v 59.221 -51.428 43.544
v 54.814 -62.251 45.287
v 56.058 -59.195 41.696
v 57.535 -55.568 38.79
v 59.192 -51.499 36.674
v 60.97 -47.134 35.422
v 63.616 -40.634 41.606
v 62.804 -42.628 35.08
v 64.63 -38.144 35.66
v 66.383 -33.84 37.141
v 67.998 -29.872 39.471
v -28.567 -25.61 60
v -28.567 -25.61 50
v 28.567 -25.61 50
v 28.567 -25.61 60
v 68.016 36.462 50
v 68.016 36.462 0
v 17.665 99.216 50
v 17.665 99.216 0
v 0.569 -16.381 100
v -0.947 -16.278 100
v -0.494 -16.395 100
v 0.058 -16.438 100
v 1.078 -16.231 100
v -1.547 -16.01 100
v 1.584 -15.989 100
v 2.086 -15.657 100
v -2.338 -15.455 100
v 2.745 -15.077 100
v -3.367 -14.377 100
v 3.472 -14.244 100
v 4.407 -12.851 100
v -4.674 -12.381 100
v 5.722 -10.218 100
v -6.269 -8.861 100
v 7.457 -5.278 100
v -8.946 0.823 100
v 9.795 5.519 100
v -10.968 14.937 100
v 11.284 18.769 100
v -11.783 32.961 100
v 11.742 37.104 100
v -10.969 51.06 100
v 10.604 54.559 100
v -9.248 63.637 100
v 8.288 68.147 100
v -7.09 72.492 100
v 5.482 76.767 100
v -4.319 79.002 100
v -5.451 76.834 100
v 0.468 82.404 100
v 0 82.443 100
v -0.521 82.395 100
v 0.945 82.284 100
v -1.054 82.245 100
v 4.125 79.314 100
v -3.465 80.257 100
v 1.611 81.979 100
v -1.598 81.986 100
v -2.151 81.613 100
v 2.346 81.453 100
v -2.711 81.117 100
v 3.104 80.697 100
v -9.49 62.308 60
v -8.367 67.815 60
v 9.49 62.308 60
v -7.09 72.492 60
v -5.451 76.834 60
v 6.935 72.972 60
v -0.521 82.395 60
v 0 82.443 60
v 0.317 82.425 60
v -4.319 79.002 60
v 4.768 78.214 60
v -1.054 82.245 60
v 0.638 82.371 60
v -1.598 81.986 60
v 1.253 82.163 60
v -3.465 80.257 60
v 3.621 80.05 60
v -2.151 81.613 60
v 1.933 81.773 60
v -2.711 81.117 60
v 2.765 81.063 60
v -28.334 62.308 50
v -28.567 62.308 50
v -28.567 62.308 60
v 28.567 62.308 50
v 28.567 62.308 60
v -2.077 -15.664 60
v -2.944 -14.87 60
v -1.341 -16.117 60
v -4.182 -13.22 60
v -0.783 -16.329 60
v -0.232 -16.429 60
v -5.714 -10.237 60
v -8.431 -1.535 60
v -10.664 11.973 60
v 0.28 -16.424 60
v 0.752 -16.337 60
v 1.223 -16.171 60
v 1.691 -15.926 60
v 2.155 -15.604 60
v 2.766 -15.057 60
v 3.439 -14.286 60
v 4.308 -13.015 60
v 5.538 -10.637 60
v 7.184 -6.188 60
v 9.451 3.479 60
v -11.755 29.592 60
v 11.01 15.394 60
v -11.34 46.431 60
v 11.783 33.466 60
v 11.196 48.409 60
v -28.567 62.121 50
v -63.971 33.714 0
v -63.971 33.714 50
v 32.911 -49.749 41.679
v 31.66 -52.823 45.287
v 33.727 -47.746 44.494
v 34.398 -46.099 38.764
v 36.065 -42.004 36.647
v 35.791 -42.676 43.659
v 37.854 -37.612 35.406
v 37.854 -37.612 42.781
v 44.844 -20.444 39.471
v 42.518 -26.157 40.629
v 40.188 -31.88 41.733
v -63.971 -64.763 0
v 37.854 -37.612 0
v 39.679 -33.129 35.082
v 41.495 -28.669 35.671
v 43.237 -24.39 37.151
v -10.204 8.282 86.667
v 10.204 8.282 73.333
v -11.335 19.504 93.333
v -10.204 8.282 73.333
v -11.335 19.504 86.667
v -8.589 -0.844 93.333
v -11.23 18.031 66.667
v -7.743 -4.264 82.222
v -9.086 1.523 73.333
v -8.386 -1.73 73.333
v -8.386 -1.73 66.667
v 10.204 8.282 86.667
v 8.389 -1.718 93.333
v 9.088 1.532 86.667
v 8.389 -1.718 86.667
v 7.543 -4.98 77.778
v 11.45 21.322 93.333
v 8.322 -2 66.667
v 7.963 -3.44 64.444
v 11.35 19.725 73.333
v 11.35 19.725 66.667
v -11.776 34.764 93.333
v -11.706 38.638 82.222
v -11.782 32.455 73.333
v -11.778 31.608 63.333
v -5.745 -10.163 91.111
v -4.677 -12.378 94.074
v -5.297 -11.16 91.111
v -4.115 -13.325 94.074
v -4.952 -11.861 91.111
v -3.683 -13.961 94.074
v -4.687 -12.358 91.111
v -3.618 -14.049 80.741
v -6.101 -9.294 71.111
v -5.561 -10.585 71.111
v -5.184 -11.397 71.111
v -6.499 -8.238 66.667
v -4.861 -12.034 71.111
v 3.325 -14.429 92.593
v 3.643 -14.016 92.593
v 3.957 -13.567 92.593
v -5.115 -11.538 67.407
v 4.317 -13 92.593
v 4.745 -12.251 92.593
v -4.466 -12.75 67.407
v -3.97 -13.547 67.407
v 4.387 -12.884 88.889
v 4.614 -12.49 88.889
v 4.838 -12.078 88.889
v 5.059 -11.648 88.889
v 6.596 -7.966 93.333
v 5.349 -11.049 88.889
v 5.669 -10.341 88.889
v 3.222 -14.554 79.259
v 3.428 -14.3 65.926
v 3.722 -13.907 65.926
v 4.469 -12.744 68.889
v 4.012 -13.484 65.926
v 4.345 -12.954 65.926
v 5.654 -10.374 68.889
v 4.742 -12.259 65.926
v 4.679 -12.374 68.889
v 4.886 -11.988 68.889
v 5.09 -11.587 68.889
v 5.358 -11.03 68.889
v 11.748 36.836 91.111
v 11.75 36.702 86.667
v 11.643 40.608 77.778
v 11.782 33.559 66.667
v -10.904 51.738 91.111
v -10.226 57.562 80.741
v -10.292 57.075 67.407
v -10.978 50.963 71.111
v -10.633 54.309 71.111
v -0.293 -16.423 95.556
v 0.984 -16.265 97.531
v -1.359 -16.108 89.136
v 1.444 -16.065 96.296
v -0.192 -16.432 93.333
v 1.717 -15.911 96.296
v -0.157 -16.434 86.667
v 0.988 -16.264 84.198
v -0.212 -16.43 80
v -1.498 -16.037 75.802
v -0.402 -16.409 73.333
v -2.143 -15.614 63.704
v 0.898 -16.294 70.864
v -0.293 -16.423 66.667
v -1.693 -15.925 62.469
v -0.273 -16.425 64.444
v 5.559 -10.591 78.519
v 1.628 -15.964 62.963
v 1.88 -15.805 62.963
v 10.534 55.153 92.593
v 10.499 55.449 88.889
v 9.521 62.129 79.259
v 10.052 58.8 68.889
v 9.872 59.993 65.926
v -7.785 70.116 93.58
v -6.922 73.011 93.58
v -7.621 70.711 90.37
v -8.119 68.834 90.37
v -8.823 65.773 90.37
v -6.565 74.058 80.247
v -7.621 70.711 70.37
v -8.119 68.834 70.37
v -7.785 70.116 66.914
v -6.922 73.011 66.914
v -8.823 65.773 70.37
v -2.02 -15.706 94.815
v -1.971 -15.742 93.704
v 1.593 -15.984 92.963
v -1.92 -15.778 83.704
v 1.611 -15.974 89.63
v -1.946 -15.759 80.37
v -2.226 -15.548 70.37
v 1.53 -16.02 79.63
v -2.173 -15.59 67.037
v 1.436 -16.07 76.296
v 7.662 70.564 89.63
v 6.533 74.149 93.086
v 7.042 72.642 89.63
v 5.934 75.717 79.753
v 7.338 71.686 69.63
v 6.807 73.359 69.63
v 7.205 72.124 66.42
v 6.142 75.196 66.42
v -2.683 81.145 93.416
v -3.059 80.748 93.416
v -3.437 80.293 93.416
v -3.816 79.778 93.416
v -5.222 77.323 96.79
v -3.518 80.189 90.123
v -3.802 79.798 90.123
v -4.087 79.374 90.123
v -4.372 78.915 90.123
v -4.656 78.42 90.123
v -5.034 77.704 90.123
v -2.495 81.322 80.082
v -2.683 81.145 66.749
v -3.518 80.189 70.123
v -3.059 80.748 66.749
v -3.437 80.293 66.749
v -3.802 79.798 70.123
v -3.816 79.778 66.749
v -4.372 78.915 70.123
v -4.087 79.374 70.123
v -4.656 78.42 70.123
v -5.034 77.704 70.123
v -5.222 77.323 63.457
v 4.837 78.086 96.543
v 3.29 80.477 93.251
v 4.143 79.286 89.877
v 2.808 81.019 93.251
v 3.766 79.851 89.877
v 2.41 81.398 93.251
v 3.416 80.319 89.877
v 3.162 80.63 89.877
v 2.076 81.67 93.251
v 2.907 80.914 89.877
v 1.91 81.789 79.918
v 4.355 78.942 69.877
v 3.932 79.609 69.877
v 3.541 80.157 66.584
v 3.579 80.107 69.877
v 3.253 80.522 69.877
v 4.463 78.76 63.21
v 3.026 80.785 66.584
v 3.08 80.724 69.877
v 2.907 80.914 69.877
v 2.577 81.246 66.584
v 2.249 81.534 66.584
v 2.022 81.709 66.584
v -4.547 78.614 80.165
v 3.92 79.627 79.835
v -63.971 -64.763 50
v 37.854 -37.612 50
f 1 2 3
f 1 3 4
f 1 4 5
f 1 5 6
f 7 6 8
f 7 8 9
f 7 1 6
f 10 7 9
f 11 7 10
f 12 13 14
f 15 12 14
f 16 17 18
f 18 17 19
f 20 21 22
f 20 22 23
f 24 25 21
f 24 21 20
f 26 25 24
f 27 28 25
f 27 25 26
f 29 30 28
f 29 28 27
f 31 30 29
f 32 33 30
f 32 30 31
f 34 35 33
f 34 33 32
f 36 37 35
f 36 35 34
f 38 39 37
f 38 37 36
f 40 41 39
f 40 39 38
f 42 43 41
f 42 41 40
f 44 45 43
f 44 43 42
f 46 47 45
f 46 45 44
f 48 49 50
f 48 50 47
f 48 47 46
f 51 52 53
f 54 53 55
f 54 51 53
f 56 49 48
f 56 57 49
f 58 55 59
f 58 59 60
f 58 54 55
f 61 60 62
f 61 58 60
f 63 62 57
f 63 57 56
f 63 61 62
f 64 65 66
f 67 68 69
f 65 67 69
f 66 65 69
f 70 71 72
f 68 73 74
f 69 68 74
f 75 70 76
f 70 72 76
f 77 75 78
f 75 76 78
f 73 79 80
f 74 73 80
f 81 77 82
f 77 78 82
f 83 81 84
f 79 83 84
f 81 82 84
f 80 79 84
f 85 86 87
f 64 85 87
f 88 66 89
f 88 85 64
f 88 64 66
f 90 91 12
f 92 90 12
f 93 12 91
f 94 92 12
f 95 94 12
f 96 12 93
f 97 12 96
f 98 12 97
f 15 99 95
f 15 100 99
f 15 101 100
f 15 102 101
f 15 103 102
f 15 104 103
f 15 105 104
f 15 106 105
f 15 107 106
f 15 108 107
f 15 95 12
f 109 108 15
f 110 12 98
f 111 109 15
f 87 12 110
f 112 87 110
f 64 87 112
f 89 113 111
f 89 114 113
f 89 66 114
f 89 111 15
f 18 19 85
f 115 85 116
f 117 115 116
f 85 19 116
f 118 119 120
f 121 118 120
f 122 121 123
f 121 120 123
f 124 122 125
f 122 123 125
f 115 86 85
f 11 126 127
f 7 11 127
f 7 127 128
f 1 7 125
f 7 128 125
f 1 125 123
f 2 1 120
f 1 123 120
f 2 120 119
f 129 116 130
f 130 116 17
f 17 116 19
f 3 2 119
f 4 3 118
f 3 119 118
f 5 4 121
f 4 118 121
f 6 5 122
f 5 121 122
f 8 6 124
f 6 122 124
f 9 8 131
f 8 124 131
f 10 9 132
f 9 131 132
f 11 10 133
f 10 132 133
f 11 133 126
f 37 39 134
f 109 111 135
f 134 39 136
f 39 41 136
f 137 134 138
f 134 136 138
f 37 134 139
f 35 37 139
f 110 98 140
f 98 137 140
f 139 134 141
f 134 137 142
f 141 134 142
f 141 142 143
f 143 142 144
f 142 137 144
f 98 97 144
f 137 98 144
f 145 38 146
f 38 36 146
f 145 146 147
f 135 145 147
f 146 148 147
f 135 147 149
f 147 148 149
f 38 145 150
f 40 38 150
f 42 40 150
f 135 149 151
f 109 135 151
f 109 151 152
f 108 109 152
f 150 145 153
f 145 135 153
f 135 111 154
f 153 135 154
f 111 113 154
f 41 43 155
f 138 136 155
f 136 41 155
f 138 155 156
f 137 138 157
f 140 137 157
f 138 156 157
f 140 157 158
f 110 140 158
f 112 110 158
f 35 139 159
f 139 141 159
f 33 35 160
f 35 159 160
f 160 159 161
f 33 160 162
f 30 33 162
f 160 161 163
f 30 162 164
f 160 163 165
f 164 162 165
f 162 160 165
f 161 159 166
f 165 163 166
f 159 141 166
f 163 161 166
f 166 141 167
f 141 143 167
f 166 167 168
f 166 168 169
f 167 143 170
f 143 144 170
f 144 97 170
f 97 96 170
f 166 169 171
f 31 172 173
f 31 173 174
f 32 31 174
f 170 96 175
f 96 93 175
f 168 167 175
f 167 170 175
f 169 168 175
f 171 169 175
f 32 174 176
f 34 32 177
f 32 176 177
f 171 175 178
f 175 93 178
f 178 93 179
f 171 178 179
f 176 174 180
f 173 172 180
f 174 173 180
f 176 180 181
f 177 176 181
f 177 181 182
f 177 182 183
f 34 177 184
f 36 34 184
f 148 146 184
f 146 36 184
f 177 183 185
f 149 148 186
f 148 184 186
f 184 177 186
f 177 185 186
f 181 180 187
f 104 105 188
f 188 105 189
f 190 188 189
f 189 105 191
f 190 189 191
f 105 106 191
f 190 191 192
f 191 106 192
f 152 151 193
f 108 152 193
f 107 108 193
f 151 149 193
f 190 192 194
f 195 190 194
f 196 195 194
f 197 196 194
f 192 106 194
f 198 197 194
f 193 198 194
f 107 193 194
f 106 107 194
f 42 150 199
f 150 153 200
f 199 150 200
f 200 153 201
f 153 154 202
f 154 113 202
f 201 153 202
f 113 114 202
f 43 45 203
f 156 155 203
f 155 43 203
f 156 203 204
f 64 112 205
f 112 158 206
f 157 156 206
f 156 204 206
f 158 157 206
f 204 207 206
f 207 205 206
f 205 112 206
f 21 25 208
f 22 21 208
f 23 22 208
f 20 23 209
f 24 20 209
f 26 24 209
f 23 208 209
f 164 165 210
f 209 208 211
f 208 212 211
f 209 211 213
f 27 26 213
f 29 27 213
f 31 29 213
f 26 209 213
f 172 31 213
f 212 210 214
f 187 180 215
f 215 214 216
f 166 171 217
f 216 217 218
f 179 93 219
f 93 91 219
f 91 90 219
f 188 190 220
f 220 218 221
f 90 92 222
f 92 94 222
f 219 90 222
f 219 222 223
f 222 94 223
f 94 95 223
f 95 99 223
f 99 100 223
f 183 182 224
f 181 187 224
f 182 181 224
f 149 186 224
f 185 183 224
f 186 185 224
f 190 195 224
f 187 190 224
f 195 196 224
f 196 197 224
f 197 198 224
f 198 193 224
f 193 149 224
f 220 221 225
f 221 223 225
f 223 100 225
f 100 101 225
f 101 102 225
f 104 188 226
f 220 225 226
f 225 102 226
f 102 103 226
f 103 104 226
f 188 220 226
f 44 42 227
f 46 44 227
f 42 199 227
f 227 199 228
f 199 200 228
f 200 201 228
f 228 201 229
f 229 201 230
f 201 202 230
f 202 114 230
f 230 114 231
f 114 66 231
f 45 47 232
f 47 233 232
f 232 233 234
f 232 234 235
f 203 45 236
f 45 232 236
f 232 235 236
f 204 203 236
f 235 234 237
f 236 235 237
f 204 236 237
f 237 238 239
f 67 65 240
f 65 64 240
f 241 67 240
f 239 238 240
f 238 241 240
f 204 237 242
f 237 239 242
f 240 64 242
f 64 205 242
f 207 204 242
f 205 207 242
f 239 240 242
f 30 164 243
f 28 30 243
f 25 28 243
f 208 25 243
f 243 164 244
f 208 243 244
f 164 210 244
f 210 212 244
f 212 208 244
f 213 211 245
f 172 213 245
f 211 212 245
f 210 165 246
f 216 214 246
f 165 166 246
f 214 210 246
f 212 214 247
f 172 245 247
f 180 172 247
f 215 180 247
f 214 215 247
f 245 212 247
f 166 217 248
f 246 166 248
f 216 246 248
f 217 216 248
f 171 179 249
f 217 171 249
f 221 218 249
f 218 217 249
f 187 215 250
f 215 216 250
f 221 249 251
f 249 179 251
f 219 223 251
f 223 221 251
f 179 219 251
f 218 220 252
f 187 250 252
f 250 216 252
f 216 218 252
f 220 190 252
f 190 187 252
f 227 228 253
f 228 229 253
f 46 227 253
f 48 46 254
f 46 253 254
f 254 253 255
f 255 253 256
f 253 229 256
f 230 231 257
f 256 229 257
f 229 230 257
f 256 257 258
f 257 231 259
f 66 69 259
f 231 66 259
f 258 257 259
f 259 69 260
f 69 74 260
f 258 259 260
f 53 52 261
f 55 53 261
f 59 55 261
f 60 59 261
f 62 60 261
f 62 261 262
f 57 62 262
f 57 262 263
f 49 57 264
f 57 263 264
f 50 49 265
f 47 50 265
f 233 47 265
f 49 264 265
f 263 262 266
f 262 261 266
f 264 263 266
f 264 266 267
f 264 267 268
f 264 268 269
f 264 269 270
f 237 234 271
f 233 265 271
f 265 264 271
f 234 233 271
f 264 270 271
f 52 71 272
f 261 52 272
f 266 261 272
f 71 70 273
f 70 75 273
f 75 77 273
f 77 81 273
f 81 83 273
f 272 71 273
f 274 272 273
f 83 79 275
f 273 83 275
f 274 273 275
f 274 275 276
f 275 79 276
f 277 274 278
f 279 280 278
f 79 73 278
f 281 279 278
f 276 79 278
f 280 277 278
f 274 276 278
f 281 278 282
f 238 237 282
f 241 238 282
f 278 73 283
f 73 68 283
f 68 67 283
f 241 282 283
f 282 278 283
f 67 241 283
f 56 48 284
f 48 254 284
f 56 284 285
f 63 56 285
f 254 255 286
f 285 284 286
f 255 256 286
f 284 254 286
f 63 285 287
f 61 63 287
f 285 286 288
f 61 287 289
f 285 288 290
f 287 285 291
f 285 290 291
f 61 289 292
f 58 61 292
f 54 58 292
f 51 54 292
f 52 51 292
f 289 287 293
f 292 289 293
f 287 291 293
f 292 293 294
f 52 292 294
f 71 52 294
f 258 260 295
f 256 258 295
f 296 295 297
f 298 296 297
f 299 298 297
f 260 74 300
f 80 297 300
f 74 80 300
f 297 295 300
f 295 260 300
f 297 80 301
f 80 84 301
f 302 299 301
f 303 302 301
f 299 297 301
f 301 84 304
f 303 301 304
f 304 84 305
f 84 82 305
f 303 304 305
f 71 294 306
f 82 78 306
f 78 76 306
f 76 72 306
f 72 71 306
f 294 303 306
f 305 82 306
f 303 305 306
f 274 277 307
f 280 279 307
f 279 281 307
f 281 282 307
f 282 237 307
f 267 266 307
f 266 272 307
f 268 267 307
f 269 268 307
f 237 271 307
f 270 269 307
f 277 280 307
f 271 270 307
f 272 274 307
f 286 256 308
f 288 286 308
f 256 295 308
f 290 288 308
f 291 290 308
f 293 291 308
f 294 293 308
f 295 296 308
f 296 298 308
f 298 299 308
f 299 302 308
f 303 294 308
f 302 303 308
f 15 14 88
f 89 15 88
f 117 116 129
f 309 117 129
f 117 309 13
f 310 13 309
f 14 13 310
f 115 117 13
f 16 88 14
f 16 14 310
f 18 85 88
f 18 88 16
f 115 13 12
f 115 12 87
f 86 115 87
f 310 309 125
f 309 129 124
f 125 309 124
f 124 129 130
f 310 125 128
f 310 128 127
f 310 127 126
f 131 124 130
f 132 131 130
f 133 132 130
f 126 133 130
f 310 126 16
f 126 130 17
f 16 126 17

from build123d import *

# Parameters (mm, degrees)
F1_DEPTH = 50
F2_W     = 57.1348965168
F2_H     = 87.9178643227
F3_DEPTH = 10
F6_DEPTH = 40
F8_DEPTH = 25


with BuildPart() as f1:
    # F0 (on Top) → F1 (new body)
    with BuildSketch(Plane.XY):
        Polygon((-63.9714916625, -64.762532711), (37.8535538912, -37.6118868589), (68.0162161589, 36.4616066217), (17.6649838686, 99.2157459259), (-63.9714916625, 33.714136177), align=None)
    extrude(amount=F1_DEPTH)

    # F2 (on face) → F3 (join)
    with BuildSketch(Plane.XY.offset(50)):
        with Locations((0, 18.3492302895)):
            Rectangle(F2_W, F2_H)
    extrude(amount=F3_DEPTH)

    # F5 (on face) → F6 (join)
    with BuildSketch(Plane.XY.offset(60)):
        with BuildLine():
            add(Edge.make_bspline(
                [(0, 82.4430584908), (-20.4088208132, 82.4430584908), (-10.2044104066, 8.2821026444), (0, -65.8788532019), (10.2044104066, 8.2821026444), (20.4088208132, 82.4430584908), (0, 82.4430584908)],
                knots=[0, 0, 0, 2.0943951024, 2.0943951024, 4.1887902048, 4.1887902048, 6.2831853072, 6.2831853072, 6.2831853072], degree=2, weights=[1, 0.5, 1, 0.5, 1, 0.5, 1]))
        make_face()
    extrude(amount=F6_DEPTH)

    # F7 (on face) → F8 (join)
    with BuildSketch(Plane(origin=(45.6069427229, -18.5711075011, 0), x_dir=(0.3771314445, 0.9261597451, 0), z_dir=(0.9261597451, -0.3771314445, 0))):
        with BuildLine():
            ThreePointArc((-36.9825174786, 45.2865598738), (-20.6596339415, 35.4221068521), (-2.0221956928, 39.4705455521))
            ThreePointArc((-2.0221956928, 39.4705455521), (-19.4655950221, 42.5995281135), (-36.9825174786, 45.2865598738))
        make_face()
    extrude(amount=F8_DEPTH)


solid = f1.part
